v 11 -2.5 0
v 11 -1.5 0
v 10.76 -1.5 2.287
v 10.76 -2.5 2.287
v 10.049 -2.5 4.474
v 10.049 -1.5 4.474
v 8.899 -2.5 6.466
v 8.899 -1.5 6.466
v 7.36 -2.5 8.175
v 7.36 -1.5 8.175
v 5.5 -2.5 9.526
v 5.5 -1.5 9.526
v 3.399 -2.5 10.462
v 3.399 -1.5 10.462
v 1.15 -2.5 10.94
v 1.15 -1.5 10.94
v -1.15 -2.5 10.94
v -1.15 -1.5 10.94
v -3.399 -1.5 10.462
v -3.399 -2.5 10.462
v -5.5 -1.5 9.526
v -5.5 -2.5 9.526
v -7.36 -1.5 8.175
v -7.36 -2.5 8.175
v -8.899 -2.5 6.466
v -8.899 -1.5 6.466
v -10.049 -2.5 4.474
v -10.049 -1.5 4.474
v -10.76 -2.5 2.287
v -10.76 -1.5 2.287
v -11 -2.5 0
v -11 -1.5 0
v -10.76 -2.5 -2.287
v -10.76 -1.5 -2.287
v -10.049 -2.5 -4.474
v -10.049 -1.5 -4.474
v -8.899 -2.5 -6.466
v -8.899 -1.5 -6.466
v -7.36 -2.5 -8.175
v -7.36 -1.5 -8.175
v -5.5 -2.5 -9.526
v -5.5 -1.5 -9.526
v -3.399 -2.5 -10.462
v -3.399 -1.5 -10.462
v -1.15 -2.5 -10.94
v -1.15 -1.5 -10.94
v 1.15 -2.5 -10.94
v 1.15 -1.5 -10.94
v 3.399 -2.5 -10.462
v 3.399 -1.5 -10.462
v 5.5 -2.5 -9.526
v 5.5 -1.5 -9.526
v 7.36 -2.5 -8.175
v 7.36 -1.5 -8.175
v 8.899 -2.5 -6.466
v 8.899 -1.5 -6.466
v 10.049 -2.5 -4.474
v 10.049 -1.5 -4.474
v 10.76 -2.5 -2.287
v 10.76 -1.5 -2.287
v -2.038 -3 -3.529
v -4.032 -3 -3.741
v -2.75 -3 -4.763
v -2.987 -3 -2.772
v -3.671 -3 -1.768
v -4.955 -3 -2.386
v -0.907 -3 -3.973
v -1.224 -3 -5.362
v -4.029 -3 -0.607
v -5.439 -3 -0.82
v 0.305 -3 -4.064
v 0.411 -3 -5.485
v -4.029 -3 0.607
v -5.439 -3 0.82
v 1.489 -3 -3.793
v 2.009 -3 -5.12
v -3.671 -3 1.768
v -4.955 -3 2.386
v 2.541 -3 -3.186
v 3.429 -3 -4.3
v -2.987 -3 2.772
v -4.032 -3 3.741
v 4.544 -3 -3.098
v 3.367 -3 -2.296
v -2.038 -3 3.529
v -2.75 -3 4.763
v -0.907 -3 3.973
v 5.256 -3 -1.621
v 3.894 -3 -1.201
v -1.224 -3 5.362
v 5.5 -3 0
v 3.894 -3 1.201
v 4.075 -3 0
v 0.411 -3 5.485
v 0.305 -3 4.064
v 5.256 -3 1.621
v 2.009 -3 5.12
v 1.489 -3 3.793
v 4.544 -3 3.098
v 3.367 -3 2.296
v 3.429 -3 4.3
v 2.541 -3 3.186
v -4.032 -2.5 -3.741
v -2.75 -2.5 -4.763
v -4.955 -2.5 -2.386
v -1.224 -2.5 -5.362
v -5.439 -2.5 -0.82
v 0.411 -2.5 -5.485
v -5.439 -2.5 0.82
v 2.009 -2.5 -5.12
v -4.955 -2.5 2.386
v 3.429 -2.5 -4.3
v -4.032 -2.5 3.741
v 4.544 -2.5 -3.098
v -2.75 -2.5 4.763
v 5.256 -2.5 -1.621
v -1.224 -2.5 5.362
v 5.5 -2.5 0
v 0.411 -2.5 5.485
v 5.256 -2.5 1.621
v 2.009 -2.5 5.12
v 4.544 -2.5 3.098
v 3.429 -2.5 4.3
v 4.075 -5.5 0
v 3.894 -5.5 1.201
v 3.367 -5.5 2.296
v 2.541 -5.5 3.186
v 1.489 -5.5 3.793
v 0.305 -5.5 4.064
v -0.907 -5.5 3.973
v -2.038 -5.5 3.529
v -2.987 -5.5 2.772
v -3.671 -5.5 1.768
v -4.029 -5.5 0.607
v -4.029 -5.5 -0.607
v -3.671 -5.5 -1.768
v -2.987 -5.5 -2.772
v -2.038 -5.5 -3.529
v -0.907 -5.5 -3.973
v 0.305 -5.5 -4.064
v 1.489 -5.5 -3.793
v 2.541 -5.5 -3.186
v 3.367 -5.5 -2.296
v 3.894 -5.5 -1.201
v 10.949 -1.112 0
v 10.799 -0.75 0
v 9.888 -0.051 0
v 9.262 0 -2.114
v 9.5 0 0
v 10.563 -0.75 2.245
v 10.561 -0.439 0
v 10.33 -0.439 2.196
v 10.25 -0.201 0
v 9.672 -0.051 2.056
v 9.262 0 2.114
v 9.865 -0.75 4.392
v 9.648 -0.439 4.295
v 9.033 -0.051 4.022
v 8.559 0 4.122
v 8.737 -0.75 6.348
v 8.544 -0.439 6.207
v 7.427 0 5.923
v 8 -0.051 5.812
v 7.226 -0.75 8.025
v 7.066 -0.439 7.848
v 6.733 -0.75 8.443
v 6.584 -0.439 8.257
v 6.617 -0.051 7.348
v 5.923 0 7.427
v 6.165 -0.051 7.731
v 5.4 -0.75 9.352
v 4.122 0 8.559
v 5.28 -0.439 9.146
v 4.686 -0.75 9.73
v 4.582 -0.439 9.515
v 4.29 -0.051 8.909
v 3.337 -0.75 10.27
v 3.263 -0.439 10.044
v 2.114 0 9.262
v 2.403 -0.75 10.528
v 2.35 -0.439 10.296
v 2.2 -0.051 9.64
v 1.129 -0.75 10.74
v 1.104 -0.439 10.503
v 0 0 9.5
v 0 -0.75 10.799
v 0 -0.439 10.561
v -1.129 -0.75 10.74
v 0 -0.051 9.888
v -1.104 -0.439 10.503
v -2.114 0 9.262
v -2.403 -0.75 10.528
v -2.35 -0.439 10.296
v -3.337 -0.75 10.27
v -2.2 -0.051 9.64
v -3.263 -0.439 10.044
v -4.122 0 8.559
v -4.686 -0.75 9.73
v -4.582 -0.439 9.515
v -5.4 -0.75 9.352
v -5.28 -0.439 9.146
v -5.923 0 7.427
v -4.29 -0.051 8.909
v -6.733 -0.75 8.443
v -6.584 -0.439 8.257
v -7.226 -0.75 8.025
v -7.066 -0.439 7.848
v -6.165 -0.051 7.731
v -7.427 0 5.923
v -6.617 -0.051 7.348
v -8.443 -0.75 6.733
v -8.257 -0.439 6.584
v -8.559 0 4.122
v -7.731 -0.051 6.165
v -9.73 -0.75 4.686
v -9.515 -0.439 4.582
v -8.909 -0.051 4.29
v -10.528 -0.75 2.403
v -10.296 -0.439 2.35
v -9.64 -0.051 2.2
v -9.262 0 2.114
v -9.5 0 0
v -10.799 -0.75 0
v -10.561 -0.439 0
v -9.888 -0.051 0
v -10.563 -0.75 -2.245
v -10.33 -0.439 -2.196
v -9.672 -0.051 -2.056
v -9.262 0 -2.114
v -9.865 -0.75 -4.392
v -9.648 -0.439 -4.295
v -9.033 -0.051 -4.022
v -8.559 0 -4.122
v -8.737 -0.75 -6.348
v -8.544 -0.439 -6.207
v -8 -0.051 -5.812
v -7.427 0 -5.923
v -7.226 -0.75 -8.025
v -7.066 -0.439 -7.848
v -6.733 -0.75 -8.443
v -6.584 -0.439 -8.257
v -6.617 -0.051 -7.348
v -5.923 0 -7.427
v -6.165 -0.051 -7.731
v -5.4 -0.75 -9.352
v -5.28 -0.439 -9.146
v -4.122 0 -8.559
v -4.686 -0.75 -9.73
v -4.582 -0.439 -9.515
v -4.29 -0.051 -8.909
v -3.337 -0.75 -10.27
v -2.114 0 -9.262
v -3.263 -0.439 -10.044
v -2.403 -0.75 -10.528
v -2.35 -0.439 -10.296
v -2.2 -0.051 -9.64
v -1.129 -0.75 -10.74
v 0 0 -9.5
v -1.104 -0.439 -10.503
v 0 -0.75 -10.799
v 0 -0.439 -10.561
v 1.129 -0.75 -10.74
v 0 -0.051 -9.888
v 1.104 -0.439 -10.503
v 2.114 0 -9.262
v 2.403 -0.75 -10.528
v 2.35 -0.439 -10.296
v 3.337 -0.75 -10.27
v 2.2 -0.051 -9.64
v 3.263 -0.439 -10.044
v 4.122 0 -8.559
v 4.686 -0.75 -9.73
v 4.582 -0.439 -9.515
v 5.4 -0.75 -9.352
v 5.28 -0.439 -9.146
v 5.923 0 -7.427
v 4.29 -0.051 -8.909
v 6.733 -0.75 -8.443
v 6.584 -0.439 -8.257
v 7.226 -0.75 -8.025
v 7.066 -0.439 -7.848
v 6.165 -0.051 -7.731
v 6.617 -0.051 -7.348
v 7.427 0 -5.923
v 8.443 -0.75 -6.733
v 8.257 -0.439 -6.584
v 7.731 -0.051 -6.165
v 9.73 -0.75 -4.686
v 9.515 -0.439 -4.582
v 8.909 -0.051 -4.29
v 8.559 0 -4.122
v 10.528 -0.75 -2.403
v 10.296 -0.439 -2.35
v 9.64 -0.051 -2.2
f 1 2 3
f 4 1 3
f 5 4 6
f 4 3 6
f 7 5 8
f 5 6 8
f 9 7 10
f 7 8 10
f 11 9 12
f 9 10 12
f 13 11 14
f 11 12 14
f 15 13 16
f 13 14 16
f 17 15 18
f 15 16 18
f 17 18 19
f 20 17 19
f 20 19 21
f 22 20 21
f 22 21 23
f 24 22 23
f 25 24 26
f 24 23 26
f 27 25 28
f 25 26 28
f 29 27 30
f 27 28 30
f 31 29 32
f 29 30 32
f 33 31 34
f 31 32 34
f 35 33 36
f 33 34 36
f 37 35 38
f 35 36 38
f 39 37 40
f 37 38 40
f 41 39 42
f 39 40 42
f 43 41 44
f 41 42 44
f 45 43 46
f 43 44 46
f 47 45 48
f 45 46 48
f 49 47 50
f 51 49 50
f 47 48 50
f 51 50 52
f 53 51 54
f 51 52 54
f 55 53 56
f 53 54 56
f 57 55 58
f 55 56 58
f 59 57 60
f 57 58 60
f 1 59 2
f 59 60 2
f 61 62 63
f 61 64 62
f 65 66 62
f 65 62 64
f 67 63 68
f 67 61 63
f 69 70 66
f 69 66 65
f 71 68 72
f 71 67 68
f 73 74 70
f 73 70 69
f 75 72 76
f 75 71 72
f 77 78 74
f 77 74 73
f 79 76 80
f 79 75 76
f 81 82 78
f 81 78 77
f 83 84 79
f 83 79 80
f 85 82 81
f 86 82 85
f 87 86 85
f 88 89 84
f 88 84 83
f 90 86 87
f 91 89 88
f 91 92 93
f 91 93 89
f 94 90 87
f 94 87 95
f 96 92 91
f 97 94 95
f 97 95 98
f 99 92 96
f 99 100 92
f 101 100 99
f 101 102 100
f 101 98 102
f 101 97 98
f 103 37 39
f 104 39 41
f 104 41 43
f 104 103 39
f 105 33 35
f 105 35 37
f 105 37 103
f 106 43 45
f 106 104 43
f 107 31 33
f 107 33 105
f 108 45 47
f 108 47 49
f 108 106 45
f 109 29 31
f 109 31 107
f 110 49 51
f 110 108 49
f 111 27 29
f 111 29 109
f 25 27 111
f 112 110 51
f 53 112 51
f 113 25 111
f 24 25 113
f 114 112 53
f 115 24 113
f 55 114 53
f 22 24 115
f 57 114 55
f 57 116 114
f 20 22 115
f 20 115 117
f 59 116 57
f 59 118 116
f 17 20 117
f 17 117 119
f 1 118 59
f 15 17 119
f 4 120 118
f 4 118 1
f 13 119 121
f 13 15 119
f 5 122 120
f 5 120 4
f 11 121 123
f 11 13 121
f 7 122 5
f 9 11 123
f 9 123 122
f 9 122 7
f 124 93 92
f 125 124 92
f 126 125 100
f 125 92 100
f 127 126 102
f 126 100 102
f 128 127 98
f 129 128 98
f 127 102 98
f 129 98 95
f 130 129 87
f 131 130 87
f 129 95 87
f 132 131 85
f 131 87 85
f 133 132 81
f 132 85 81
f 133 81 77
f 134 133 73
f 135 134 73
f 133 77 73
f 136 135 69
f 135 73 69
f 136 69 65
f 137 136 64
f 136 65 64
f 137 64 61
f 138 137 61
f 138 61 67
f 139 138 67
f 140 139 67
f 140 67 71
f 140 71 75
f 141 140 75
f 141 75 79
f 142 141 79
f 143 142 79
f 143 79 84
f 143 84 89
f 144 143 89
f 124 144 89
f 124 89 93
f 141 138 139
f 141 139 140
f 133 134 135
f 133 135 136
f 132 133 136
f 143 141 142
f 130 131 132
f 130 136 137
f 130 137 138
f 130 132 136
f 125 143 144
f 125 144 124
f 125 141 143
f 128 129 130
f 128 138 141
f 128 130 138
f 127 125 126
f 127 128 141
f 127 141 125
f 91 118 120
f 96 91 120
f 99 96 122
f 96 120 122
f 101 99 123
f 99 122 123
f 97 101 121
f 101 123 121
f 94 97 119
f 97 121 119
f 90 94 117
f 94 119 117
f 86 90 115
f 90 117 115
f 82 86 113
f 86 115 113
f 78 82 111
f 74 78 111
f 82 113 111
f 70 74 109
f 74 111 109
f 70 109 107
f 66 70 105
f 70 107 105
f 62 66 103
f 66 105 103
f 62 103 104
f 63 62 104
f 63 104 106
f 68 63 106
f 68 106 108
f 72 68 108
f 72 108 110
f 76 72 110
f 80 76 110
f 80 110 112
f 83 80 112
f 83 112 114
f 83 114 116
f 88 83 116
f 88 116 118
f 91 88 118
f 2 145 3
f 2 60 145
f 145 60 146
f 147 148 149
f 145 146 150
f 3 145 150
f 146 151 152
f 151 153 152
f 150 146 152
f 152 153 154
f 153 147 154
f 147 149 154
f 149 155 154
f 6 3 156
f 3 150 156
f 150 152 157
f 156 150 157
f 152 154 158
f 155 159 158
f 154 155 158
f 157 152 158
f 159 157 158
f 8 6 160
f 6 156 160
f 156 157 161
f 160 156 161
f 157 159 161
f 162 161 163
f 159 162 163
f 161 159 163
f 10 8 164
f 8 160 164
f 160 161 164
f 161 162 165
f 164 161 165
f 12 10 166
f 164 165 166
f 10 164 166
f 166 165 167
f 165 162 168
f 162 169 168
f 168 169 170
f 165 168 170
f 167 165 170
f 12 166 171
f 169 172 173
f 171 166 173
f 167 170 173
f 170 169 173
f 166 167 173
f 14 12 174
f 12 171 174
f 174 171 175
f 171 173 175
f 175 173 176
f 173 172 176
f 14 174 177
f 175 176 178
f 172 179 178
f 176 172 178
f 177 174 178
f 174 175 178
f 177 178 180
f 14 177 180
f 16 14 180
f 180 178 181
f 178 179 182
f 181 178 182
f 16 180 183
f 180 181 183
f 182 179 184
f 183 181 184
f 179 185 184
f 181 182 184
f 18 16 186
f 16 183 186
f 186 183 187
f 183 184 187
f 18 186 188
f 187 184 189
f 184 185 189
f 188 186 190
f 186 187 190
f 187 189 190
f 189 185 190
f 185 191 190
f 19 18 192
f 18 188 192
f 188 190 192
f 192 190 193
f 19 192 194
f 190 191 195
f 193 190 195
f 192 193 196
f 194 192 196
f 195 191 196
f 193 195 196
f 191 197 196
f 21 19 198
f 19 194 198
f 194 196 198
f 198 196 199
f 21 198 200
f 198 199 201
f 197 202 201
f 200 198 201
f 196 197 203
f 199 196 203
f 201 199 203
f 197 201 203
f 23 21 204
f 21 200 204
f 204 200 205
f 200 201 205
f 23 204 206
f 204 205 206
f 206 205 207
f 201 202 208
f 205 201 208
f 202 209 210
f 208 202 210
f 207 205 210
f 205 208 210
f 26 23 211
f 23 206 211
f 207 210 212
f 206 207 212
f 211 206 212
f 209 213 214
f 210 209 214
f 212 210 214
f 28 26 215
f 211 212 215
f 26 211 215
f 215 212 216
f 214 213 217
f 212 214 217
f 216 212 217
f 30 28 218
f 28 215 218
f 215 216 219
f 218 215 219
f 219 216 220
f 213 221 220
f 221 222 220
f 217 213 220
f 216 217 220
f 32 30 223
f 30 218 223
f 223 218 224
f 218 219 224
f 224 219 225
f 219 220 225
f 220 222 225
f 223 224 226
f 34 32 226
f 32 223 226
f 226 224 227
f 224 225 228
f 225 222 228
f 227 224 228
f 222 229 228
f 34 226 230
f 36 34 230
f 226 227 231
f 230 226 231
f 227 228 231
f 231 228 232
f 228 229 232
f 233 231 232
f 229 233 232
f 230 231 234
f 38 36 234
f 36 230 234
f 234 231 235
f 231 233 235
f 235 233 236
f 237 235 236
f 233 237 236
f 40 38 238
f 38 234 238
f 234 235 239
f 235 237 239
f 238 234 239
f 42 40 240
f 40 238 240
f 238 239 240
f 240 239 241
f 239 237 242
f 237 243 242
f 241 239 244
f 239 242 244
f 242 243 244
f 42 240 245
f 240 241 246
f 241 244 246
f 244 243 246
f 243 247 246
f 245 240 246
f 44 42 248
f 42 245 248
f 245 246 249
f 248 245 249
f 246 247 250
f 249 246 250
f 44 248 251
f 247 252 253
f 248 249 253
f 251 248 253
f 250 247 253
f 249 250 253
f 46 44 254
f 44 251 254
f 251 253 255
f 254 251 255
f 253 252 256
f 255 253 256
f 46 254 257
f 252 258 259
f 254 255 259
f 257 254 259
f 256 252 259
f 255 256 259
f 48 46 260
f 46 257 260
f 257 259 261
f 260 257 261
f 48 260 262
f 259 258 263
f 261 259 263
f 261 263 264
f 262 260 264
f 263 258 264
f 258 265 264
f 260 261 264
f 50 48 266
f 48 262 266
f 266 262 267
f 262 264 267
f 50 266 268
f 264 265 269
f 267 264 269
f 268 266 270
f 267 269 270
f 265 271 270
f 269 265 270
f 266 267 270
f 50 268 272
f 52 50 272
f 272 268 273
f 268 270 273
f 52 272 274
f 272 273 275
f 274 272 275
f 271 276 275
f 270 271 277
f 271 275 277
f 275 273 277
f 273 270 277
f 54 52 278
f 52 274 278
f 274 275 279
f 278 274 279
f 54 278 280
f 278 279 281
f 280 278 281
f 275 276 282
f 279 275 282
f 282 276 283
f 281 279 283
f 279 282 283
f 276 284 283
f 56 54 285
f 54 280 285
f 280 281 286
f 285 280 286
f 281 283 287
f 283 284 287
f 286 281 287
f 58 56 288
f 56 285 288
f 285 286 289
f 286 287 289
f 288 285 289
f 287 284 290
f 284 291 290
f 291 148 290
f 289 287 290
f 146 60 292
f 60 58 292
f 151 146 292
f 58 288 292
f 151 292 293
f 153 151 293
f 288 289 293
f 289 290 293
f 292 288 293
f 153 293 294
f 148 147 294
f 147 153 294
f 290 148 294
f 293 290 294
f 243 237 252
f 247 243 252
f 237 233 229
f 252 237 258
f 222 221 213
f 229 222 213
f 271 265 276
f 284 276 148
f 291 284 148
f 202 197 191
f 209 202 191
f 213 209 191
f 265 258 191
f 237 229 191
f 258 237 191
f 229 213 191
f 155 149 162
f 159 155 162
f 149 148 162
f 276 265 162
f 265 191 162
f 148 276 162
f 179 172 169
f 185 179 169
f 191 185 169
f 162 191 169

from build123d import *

# Parameters (mm, degrees)
F0_R     = 11
F0_R_2   = 5.5
F1_DEPTH = 2.5
F0_R_3   = 4.075
F2_DEPTH = 3
F3_DEPTH = 5.5
F4_R     = 1.5


with BuildPart() as f1:
    # F0 (on Front) → F1 (new body)
    with BuildSketch(Plane.XZ):
        Circle(F0_R)
        Circle(F0_R_2, mode=Mode.SUBTRACT)
    extrude(amount=F1_DEPTH)

    # F0 (on Front) → F2 (join)
    with BuildSketch(Plane.XZ):
        Circle(F0_R_2)
        Circle(F0_R_3, mode=Mode.SUBTRACT)
    extrude(amount=F2_DEPTH)

    # F0 (on Front) → F3 (join)
    with BuildSketch(Plane.XZ):
        Circle(F0_R_3)
    extrude(amount=F3_DEPTH)

    # F4
    f4_edges = [f1.edges().sort_by_distance(p)[0] for p in [
        (-11, 0, 0),
    ]]
    fillet(f4_edges, radius=F4_R)


solid = f1.part
